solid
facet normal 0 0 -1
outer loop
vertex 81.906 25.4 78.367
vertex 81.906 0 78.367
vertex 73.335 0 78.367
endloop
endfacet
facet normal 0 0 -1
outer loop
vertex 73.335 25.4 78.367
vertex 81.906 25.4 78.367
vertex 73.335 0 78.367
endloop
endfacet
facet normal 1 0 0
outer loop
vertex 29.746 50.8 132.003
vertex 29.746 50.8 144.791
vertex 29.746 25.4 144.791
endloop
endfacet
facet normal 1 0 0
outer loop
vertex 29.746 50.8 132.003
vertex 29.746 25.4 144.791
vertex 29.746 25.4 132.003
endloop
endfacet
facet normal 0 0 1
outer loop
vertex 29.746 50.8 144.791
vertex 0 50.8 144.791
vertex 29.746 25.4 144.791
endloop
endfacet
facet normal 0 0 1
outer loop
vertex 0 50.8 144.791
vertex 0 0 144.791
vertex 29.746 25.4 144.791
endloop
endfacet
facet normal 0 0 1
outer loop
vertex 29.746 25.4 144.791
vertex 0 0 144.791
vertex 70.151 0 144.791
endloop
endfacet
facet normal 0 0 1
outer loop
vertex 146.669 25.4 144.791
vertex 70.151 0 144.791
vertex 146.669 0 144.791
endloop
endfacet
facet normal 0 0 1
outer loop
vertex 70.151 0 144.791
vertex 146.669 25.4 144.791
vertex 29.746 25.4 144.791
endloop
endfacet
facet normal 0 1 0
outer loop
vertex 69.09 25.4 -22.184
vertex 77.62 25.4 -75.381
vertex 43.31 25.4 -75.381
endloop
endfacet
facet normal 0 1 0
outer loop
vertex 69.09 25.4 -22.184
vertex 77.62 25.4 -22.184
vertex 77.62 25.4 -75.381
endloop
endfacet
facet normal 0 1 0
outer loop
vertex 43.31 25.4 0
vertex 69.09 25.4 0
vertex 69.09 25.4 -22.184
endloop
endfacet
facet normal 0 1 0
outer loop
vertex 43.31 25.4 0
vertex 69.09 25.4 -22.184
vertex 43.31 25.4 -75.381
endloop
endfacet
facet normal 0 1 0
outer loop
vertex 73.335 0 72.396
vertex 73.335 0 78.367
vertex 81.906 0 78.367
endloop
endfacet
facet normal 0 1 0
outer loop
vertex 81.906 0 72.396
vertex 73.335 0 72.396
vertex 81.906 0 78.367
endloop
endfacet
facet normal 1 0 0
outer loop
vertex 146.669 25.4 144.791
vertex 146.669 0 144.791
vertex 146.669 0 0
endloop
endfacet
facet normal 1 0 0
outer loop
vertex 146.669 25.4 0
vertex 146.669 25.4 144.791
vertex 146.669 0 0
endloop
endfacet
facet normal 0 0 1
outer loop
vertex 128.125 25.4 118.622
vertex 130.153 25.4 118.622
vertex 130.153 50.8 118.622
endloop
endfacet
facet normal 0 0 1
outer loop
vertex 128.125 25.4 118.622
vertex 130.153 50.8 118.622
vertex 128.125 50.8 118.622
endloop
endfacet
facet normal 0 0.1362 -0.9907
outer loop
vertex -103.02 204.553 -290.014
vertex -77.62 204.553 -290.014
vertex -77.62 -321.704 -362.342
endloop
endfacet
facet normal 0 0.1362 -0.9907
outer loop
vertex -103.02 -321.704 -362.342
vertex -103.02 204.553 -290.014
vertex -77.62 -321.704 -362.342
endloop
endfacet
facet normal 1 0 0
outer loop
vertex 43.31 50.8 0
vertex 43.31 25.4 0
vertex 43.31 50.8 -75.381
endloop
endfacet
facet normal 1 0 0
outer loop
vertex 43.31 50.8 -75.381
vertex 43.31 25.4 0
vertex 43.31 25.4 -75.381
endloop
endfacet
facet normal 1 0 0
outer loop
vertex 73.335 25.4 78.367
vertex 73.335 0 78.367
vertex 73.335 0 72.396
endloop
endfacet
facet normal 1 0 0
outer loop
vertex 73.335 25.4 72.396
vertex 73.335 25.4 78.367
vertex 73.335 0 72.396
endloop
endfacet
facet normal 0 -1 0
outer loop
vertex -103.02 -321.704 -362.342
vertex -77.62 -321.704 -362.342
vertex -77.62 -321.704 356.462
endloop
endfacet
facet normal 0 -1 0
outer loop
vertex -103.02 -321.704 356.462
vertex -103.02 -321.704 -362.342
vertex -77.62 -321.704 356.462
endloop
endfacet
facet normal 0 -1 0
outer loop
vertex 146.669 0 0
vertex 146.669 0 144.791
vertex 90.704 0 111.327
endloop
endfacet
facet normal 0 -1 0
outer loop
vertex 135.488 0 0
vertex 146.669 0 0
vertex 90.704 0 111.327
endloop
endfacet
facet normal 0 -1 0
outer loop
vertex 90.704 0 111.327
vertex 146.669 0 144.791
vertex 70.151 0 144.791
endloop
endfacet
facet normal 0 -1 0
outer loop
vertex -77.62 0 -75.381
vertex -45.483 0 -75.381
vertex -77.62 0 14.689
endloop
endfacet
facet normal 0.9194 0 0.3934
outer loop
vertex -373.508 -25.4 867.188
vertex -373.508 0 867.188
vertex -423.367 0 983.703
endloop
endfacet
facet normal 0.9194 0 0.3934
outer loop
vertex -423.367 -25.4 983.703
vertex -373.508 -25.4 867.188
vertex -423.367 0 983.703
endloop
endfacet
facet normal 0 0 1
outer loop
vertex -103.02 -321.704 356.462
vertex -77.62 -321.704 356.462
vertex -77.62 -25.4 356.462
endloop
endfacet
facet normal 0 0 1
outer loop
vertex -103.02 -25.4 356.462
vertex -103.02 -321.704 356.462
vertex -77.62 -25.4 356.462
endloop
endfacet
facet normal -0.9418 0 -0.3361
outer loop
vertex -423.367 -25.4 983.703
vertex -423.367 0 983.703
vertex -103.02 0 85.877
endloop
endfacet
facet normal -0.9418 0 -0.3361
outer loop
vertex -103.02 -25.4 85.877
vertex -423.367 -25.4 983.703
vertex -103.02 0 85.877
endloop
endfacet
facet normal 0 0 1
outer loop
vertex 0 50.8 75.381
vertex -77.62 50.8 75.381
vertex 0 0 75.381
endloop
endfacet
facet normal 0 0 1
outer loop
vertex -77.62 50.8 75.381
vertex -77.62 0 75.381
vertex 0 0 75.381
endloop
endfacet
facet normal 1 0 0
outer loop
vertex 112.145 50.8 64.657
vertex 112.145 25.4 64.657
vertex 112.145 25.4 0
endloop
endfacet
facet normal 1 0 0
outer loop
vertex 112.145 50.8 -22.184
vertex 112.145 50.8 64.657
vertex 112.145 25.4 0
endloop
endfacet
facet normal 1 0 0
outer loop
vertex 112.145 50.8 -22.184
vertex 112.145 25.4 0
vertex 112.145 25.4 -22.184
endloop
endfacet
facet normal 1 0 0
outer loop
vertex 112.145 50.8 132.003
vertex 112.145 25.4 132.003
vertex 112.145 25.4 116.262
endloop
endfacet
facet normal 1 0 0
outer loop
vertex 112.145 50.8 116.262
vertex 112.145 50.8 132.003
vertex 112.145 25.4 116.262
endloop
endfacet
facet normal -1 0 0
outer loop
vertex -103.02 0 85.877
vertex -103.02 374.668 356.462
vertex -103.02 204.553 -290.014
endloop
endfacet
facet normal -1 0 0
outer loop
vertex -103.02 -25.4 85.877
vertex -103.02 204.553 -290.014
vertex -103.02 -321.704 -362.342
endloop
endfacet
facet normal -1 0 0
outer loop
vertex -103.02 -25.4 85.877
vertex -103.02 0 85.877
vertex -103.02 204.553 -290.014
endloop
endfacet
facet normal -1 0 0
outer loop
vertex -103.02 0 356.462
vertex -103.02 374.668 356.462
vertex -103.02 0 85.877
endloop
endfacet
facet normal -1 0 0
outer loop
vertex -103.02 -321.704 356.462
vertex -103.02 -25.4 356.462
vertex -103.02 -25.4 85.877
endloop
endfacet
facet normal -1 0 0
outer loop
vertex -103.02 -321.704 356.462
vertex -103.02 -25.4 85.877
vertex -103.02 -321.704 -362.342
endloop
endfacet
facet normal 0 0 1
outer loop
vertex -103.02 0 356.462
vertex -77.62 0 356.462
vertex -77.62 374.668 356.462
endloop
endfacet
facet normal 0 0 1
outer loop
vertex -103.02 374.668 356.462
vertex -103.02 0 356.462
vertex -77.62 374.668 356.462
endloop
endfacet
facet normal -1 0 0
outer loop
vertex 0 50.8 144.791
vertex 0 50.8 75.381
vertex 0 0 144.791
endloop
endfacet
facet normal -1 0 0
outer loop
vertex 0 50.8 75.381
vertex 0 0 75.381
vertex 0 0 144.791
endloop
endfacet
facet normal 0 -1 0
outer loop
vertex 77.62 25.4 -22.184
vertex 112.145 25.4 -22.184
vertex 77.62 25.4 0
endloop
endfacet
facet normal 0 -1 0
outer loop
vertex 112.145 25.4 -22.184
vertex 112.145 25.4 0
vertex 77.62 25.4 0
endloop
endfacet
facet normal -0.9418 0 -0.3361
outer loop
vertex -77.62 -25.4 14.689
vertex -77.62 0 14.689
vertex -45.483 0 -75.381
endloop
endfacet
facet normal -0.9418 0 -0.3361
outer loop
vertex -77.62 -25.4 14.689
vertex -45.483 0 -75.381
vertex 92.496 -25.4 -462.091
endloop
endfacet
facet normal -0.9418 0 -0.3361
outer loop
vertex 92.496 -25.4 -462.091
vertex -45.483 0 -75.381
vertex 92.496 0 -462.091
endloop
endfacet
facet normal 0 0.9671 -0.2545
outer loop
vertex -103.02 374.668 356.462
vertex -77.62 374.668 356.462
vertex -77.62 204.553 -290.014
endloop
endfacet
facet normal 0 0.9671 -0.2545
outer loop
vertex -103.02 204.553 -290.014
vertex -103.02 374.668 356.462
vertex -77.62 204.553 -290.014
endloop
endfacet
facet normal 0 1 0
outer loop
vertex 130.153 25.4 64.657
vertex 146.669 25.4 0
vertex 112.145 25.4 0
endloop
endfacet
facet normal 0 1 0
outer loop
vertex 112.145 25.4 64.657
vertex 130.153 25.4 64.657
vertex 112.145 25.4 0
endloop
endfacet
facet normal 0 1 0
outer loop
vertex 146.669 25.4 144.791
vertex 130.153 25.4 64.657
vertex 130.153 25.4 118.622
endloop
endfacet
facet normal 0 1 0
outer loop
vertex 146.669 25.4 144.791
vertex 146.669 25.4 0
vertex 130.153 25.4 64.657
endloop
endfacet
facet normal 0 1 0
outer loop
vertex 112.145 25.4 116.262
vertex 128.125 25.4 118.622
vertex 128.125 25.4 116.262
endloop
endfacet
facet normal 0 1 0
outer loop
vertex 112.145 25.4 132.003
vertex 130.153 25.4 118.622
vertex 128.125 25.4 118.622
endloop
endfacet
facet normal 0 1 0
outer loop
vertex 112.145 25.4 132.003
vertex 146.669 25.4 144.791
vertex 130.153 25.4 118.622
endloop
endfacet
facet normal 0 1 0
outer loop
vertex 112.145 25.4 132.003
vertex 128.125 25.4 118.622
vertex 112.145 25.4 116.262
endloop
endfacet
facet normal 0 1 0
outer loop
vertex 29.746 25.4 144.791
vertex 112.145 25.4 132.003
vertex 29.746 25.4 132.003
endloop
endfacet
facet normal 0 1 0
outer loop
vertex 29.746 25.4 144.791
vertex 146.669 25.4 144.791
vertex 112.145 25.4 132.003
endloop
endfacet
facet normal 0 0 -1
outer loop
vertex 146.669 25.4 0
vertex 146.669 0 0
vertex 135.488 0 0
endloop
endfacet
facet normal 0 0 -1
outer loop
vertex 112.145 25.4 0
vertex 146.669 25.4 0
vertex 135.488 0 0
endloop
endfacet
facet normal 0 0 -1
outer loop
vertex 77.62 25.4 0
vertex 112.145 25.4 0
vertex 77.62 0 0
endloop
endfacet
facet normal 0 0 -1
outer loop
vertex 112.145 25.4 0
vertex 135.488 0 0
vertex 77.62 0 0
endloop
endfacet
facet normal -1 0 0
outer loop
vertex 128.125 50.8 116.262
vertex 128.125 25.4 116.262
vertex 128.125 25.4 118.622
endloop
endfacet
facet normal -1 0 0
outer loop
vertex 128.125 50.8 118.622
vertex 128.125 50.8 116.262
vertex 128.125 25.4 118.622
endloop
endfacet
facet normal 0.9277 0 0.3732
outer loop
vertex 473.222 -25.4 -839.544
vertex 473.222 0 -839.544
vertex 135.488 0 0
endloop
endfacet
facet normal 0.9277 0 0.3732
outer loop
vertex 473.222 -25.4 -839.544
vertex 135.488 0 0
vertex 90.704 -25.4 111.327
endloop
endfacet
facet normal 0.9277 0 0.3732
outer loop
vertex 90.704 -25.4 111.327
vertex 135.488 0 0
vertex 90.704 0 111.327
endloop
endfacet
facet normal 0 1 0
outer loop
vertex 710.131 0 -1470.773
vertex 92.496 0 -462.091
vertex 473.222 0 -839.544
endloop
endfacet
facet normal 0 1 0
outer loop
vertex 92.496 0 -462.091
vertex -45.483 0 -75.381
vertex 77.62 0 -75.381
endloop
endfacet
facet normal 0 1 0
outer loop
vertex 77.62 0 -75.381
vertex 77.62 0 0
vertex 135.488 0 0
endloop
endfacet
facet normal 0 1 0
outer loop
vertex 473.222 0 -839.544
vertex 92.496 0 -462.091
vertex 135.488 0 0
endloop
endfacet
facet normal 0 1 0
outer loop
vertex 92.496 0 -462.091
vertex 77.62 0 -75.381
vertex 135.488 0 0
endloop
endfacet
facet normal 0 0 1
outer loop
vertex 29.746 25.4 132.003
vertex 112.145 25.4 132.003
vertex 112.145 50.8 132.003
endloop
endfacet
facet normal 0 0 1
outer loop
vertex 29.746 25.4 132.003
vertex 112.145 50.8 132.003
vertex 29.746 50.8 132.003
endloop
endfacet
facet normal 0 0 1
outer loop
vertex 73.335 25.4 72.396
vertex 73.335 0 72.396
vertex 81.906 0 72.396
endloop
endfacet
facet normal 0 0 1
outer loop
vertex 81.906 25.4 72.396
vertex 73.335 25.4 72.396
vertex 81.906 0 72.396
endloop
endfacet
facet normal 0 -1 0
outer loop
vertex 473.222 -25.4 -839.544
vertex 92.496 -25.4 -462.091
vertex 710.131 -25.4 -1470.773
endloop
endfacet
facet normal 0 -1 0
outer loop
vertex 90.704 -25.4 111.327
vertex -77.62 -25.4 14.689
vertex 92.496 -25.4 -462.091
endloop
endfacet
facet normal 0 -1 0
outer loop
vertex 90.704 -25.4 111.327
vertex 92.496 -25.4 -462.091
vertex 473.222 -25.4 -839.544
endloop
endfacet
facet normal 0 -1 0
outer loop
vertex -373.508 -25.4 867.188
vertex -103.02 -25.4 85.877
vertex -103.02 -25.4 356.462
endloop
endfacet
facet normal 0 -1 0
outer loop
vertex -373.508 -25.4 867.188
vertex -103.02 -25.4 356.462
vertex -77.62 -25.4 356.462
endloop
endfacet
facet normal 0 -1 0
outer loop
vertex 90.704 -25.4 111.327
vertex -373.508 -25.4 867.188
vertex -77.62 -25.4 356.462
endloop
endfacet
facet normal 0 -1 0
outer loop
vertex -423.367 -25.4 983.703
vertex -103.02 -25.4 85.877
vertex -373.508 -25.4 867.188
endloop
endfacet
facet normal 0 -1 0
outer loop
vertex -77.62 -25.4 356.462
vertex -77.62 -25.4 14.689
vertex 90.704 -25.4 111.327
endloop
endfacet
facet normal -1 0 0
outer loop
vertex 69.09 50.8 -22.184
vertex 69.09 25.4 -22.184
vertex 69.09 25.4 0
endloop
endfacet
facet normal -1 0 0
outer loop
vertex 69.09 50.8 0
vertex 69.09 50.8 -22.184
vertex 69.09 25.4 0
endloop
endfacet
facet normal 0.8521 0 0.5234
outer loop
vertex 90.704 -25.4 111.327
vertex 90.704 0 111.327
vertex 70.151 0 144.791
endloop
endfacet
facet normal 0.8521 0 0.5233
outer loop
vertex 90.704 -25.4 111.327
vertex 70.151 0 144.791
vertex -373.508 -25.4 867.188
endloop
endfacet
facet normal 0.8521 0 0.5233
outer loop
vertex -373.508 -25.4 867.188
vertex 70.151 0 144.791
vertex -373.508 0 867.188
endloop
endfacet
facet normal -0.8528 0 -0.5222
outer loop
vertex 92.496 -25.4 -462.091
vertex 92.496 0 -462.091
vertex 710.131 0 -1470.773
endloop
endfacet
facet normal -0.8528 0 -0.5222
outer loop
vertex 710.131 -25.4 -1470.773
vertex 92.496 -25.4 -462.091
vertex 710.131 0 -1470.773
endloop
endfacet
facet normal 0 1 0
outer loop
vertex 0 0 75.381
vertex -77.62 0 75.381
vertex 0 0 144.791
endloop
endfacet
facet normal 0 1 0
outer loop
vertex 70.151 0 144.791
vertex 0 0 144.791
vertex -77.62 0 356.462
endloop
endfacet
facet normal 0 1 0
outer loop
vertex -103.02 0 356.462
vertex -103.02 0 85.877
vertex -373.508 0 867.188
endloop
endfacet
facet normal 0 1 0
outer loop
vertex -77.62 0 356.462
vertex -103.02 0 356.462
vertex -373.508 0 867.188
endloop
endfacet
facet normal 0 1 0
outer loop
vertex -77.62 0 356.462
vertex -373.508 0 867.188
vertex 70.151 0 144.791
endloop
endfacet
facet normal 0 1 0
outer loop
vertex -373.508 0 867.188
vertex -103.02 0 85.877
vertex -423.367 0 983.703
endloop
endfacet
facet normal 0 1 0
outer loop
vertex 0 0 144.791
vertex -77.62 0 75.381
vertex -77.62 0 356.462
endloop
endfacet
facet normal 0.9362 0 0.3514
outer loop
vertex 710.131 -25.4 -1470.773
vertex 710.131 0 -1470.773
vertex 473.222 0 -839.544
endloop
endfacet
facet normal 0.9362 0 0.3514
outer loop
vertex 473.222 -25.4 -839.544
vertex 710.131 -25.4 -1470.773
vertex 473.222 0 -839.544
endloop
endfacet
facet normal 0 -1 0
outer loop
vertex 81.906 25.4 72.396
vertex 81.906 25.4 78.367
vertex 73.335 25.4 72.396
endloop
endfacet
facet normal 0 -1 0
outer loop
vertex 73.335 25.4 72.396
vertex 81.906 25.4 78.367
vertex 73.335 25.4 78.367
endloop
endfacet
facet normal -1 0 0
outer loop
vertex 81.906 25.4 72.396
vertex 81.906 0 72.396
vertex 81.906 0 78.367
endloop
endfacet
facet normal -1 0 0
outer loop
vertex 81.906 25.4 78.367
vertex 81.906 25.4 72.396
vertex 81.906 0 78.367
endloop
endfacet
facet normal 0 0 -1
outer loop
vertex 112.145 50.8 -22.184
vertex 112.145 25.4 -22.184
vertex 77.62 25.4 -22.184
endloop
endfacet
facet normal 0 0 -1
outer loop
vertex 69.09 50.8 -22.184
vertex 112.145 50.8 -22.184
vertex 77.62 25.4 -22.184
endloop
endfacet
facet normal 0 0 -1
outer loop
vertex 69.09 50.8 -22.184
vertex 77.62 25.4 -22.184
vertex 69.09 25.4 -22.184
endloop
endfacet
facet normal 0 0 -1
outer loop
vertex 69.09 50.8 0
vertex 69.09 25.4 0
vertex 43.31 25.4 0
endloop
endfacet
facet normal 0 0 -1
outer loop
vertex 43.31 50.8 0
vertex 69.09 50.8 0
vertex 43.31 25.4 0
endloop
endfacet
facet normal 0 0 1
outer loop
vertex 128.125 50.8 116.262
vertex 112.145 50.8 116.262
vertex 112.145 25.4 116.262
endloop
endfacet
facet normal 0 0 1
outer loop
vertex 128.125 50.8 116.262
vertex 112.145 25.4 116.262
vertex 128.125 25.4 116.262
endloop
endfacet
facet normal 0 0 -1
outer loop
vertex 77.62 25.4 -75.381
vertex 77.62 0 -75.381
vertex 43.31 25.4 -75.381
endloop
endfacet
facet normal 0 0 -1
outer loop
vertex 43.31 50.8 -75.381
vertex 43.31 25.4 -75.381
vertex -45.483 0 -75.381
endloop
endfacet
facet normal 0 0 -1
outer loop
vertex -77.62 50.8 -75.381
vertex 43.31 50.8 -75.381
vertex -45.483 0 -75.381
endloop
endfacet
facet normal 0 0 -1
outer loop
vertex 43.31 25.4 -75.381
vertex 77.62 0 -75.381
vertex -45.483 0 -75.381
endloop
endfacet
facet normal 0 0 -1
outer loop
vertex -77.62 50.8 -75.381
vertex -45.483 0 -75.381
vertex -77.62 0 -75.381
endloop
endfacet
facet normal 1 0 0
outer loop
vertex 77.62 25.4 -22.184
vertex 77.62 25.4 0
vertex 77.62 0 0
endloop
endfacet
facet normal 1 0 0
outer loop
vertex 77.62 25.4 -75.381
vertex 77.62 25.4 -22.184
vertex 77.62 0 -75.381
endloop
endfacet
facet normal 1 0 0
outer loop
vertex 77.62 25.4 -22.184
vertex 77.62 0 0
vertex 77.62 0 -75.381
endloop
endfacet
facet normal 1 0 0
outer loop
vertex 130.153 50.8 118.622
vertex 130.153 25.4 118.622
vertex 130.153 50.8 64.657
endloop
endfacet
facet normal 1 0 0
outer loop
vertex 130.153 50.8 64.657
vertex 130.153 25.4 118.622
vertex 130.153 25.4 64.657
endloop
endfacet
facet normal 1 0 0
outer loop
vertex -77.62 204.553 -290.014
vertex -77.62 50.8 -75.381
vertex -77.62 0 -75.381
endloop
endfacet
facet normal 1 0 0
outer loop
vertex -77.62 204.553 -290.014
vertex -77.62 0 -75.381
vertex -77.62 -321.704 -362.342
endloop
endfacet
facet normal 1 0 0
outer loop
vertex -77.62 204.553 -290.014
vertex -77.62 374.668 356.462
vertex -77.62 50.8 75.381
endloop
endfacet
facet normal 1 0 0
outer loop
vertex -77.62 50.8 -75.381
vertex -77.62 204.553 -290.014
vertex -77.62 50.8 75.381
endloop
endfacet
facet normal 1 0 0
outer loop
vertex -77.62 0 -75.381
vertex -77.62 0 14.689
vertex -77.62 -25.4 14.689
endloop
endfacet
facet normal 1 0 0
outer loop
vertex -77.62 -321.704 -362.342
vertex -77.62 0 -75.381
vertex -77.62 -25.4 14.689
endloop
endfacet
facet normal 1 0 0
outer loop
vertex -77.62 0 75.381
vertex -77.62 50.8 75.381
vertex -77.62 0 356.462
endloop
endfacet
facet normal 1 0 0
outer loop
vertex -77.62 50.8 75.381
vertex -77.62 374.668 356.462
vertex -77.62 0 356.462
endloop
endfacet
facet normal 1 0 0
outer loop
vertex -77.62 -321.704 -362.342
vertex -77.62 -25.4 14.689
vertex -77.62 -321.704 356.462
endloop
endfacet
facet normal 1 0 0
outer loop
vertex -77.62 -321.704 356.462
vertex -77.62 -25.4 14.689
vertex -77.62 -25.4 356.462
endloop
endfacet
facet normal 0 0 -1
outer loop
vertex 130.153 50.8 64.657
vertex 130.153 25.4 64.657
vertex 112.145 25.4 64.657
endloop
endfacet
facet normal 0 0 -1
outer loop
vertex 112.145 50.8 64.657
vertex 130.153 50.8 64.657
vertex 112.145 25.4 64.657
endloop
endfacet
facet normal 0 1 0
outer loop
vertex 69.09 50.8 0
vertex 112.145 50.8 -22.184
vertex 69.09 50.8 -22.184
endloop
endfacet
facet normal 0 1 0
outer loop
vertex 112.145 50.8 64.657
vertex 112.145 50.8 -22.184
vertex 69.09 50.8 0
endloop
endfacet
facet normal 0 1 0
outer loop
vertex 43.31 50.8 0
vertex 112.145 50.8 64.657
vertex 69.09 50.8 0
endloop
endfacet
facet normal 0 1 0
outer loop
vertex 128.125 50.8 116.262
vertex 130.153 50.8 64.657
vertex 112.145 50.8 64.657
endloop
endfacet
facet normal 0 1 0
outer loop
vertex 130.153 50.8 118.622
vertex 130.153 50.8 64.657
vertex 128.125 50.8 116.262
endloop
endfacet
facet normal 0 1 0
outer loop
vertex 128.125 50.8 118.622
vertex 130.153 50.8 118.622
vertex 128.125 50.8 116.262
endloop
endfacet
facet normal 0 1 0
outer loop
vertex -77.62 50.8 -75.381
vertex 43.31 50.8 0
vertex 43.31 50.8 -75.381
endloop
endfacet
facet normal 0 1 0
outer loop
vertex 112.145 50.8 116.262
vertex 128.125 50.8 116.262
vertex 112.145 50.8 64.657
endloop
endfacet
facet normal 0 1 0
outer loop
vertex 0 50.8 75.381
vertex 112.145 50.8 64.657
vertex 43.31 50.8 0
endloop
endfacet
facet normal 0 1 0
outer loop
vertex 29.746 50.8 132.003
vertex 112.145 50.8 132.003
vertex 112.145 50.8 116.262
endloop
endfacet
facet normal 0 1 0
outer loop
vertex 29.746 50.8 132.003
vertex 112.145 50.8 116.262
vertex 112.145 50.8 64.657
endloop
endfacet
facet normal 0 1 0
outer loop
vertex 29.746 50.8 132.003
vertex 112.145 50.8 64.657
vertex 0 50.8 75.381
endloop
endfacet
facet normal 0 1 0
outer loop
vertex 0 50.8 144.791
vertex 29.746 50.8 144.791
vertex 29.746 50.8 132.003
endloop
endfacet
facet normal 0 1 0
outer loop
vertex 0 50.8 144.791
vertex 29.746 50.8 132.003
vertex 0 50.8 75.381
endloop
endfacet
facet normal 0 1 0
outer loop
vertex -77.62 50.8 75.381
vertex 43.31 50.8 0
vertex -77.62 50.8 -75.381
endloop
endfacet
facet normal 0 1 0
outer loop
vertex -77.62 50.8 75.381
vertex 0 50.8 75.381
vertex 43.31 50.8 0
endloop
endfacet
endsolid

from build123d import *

# Parameters (mm, degrees)
F1_DEPTH = 25.4
F3_DEPTH = 25.4
F4_W     = 29.7458320856
F4_H     = 10.7239410281
F4_W_2   = 77.620446682
F4_W_3   = 25.7802940905
F4_H_2   = 64.6573156118
F4_W_4   = 82.3989063501
F4_H_3   = 15.7408937812
F4_W_5   = 43.0548340082
F4_H_4   = 22.1842341125
F4_W_6   = 2.0285844803
F4_H_5   = 2.3600235581
F5_DEPTH = 25.4
F7_DEPTH = 25.4


with BuildPart() as f1:
    # F0 (on Front) → F1 (new body)
    with BuildSketch(Plane.XZ):
        Polygon((90.7035768032, 111.3269925117), (-373.5082440503, 867.1883240136), (-423.3669042587, 983.7029576302), (92.4958586693, -462.0907306671), (710.130751133, -1470.7733392715), (473.2221364975, -839.5437598228), align=None)
    extrude(amount=F1_DEPTH)

    # F2 (on face) → F3 (join)
    with BuildSketch(Plane(origin=(0, 0, 0), x_dir=(-1, 0, 0), z_dir=(0, 1, 0))):
        Polygon((-81.9063782692, 78.366830945), (-73.3345150948, 78.366830945), (-73.3345150948, 75.38125664), (0, 75.38125664), (0, 144.7913646698), (-146.6690301895, 144.7913646698), (-146.6690301895, 0), (-77.620446682, 0), (-77.620446682, 72.3956823349), (-81.9063782692, 72.3956823349), align=None)
        Polygon((0, 75.38125664), (-73.3345150948, 75.38125664), (-73.3345150948, 72.3956823349), (-77.620446682, 72.3956823349), (-77.620446682, 0), (0, 0), align=None)
        Polygon((77.620446682, 75.38125664), (0, 75.38125664), (0, 0), (-77.620446682, 0), (-77.620446682, -75.38125664), (77.620446682, -75.38125664), align=None)
    extrude(amount=F3_DEPTH)

    # F4 (on face) → F5 (join)
    with BuildSketch(Plane(origin=(0, 25.4, 0), x_dir=(-1, 0, 0), z_dir=(0, 1, 0))):
        with Locations((-14.8729160428, 70.0192861259)):
            Rectangle(F4_W, F4_H)
        Polygon((-43.309610337, 64.6573156118), (-29.7458320856, 64.6573156118), (-29.7458320856, 75.38125664), (-29.7458320856, 116.2622794509), (-112.1447384357, 116.2622794509), (-112.1447384357, 64.6573156118), (-69.0899044275, 64.6573156118), align=None)
        Polygon((0, 64.6573156118), (-29.7458320856, 64.6573156118), (-43.309610337, 64.6573156118), (-43.309610337, 0), (-43.309610337, -75.38125664), (77.620446682, -75.38125664), (77.620446682, 64.6573156118), align=None)
        with Locations((38.810223341, 70.0192861259)):
            Rectangle(F4_W_2, F4_H)
        Polygon((-29.7458320856, 116.2622794509), (-29.7458320856, 75.38125664), (0, 75.38125664), (0, 144.7913646698), (-29.7458320856, 144.7913646698), (-29.7458320856, 132.0031732321), align=None)
        with Locations((-56.1997573823, 32.3286578059)):
            Rectangle(F4_W_3, F4_H_2)
        with Locations((-70.9452852607, 124.1327263415)):
            Rectangle(F4_W_4, F4_H_3)
        with Locations((-90.6173214316, 32.3286578059)):
            Rectangle(F4_W_5, F4_H_2)
        Polygon((-112.1447384357, 64.6573156118), (-112.1447384357, 116.2622794509), (-128.1245350838, 116.2622794509), (-130.1531195641, 116.2622794509), (-130.1531195641, 64.6573156118), align=None)
        with Locations((-90.6173214316, -11.0921170563)):
            Rectangle(F4_W_5, F4_H_4)
        with Locations((-129.1388273239, 117.44229123)):
            Rectangle(F4_W_6, F4_H_5)
    extrude(amount=F5_DEPTH)

    # F6 (on face) → F7 (join)
    with BuildSketch(Plane(origin=(-77.620446682, 0, 0), x_dir=(0, -1, 0), z_dir=(-1, 0, 0))):
        Polygon((321.7040300369, 356.4623594284), (-374.66776371, 356.4623594284), (-204.5531272888, -290.0140881538), (321.7040300369, -362.3423576355), align=None)
    extrude(amount=F7_DEPTH)


solid = f1.part
